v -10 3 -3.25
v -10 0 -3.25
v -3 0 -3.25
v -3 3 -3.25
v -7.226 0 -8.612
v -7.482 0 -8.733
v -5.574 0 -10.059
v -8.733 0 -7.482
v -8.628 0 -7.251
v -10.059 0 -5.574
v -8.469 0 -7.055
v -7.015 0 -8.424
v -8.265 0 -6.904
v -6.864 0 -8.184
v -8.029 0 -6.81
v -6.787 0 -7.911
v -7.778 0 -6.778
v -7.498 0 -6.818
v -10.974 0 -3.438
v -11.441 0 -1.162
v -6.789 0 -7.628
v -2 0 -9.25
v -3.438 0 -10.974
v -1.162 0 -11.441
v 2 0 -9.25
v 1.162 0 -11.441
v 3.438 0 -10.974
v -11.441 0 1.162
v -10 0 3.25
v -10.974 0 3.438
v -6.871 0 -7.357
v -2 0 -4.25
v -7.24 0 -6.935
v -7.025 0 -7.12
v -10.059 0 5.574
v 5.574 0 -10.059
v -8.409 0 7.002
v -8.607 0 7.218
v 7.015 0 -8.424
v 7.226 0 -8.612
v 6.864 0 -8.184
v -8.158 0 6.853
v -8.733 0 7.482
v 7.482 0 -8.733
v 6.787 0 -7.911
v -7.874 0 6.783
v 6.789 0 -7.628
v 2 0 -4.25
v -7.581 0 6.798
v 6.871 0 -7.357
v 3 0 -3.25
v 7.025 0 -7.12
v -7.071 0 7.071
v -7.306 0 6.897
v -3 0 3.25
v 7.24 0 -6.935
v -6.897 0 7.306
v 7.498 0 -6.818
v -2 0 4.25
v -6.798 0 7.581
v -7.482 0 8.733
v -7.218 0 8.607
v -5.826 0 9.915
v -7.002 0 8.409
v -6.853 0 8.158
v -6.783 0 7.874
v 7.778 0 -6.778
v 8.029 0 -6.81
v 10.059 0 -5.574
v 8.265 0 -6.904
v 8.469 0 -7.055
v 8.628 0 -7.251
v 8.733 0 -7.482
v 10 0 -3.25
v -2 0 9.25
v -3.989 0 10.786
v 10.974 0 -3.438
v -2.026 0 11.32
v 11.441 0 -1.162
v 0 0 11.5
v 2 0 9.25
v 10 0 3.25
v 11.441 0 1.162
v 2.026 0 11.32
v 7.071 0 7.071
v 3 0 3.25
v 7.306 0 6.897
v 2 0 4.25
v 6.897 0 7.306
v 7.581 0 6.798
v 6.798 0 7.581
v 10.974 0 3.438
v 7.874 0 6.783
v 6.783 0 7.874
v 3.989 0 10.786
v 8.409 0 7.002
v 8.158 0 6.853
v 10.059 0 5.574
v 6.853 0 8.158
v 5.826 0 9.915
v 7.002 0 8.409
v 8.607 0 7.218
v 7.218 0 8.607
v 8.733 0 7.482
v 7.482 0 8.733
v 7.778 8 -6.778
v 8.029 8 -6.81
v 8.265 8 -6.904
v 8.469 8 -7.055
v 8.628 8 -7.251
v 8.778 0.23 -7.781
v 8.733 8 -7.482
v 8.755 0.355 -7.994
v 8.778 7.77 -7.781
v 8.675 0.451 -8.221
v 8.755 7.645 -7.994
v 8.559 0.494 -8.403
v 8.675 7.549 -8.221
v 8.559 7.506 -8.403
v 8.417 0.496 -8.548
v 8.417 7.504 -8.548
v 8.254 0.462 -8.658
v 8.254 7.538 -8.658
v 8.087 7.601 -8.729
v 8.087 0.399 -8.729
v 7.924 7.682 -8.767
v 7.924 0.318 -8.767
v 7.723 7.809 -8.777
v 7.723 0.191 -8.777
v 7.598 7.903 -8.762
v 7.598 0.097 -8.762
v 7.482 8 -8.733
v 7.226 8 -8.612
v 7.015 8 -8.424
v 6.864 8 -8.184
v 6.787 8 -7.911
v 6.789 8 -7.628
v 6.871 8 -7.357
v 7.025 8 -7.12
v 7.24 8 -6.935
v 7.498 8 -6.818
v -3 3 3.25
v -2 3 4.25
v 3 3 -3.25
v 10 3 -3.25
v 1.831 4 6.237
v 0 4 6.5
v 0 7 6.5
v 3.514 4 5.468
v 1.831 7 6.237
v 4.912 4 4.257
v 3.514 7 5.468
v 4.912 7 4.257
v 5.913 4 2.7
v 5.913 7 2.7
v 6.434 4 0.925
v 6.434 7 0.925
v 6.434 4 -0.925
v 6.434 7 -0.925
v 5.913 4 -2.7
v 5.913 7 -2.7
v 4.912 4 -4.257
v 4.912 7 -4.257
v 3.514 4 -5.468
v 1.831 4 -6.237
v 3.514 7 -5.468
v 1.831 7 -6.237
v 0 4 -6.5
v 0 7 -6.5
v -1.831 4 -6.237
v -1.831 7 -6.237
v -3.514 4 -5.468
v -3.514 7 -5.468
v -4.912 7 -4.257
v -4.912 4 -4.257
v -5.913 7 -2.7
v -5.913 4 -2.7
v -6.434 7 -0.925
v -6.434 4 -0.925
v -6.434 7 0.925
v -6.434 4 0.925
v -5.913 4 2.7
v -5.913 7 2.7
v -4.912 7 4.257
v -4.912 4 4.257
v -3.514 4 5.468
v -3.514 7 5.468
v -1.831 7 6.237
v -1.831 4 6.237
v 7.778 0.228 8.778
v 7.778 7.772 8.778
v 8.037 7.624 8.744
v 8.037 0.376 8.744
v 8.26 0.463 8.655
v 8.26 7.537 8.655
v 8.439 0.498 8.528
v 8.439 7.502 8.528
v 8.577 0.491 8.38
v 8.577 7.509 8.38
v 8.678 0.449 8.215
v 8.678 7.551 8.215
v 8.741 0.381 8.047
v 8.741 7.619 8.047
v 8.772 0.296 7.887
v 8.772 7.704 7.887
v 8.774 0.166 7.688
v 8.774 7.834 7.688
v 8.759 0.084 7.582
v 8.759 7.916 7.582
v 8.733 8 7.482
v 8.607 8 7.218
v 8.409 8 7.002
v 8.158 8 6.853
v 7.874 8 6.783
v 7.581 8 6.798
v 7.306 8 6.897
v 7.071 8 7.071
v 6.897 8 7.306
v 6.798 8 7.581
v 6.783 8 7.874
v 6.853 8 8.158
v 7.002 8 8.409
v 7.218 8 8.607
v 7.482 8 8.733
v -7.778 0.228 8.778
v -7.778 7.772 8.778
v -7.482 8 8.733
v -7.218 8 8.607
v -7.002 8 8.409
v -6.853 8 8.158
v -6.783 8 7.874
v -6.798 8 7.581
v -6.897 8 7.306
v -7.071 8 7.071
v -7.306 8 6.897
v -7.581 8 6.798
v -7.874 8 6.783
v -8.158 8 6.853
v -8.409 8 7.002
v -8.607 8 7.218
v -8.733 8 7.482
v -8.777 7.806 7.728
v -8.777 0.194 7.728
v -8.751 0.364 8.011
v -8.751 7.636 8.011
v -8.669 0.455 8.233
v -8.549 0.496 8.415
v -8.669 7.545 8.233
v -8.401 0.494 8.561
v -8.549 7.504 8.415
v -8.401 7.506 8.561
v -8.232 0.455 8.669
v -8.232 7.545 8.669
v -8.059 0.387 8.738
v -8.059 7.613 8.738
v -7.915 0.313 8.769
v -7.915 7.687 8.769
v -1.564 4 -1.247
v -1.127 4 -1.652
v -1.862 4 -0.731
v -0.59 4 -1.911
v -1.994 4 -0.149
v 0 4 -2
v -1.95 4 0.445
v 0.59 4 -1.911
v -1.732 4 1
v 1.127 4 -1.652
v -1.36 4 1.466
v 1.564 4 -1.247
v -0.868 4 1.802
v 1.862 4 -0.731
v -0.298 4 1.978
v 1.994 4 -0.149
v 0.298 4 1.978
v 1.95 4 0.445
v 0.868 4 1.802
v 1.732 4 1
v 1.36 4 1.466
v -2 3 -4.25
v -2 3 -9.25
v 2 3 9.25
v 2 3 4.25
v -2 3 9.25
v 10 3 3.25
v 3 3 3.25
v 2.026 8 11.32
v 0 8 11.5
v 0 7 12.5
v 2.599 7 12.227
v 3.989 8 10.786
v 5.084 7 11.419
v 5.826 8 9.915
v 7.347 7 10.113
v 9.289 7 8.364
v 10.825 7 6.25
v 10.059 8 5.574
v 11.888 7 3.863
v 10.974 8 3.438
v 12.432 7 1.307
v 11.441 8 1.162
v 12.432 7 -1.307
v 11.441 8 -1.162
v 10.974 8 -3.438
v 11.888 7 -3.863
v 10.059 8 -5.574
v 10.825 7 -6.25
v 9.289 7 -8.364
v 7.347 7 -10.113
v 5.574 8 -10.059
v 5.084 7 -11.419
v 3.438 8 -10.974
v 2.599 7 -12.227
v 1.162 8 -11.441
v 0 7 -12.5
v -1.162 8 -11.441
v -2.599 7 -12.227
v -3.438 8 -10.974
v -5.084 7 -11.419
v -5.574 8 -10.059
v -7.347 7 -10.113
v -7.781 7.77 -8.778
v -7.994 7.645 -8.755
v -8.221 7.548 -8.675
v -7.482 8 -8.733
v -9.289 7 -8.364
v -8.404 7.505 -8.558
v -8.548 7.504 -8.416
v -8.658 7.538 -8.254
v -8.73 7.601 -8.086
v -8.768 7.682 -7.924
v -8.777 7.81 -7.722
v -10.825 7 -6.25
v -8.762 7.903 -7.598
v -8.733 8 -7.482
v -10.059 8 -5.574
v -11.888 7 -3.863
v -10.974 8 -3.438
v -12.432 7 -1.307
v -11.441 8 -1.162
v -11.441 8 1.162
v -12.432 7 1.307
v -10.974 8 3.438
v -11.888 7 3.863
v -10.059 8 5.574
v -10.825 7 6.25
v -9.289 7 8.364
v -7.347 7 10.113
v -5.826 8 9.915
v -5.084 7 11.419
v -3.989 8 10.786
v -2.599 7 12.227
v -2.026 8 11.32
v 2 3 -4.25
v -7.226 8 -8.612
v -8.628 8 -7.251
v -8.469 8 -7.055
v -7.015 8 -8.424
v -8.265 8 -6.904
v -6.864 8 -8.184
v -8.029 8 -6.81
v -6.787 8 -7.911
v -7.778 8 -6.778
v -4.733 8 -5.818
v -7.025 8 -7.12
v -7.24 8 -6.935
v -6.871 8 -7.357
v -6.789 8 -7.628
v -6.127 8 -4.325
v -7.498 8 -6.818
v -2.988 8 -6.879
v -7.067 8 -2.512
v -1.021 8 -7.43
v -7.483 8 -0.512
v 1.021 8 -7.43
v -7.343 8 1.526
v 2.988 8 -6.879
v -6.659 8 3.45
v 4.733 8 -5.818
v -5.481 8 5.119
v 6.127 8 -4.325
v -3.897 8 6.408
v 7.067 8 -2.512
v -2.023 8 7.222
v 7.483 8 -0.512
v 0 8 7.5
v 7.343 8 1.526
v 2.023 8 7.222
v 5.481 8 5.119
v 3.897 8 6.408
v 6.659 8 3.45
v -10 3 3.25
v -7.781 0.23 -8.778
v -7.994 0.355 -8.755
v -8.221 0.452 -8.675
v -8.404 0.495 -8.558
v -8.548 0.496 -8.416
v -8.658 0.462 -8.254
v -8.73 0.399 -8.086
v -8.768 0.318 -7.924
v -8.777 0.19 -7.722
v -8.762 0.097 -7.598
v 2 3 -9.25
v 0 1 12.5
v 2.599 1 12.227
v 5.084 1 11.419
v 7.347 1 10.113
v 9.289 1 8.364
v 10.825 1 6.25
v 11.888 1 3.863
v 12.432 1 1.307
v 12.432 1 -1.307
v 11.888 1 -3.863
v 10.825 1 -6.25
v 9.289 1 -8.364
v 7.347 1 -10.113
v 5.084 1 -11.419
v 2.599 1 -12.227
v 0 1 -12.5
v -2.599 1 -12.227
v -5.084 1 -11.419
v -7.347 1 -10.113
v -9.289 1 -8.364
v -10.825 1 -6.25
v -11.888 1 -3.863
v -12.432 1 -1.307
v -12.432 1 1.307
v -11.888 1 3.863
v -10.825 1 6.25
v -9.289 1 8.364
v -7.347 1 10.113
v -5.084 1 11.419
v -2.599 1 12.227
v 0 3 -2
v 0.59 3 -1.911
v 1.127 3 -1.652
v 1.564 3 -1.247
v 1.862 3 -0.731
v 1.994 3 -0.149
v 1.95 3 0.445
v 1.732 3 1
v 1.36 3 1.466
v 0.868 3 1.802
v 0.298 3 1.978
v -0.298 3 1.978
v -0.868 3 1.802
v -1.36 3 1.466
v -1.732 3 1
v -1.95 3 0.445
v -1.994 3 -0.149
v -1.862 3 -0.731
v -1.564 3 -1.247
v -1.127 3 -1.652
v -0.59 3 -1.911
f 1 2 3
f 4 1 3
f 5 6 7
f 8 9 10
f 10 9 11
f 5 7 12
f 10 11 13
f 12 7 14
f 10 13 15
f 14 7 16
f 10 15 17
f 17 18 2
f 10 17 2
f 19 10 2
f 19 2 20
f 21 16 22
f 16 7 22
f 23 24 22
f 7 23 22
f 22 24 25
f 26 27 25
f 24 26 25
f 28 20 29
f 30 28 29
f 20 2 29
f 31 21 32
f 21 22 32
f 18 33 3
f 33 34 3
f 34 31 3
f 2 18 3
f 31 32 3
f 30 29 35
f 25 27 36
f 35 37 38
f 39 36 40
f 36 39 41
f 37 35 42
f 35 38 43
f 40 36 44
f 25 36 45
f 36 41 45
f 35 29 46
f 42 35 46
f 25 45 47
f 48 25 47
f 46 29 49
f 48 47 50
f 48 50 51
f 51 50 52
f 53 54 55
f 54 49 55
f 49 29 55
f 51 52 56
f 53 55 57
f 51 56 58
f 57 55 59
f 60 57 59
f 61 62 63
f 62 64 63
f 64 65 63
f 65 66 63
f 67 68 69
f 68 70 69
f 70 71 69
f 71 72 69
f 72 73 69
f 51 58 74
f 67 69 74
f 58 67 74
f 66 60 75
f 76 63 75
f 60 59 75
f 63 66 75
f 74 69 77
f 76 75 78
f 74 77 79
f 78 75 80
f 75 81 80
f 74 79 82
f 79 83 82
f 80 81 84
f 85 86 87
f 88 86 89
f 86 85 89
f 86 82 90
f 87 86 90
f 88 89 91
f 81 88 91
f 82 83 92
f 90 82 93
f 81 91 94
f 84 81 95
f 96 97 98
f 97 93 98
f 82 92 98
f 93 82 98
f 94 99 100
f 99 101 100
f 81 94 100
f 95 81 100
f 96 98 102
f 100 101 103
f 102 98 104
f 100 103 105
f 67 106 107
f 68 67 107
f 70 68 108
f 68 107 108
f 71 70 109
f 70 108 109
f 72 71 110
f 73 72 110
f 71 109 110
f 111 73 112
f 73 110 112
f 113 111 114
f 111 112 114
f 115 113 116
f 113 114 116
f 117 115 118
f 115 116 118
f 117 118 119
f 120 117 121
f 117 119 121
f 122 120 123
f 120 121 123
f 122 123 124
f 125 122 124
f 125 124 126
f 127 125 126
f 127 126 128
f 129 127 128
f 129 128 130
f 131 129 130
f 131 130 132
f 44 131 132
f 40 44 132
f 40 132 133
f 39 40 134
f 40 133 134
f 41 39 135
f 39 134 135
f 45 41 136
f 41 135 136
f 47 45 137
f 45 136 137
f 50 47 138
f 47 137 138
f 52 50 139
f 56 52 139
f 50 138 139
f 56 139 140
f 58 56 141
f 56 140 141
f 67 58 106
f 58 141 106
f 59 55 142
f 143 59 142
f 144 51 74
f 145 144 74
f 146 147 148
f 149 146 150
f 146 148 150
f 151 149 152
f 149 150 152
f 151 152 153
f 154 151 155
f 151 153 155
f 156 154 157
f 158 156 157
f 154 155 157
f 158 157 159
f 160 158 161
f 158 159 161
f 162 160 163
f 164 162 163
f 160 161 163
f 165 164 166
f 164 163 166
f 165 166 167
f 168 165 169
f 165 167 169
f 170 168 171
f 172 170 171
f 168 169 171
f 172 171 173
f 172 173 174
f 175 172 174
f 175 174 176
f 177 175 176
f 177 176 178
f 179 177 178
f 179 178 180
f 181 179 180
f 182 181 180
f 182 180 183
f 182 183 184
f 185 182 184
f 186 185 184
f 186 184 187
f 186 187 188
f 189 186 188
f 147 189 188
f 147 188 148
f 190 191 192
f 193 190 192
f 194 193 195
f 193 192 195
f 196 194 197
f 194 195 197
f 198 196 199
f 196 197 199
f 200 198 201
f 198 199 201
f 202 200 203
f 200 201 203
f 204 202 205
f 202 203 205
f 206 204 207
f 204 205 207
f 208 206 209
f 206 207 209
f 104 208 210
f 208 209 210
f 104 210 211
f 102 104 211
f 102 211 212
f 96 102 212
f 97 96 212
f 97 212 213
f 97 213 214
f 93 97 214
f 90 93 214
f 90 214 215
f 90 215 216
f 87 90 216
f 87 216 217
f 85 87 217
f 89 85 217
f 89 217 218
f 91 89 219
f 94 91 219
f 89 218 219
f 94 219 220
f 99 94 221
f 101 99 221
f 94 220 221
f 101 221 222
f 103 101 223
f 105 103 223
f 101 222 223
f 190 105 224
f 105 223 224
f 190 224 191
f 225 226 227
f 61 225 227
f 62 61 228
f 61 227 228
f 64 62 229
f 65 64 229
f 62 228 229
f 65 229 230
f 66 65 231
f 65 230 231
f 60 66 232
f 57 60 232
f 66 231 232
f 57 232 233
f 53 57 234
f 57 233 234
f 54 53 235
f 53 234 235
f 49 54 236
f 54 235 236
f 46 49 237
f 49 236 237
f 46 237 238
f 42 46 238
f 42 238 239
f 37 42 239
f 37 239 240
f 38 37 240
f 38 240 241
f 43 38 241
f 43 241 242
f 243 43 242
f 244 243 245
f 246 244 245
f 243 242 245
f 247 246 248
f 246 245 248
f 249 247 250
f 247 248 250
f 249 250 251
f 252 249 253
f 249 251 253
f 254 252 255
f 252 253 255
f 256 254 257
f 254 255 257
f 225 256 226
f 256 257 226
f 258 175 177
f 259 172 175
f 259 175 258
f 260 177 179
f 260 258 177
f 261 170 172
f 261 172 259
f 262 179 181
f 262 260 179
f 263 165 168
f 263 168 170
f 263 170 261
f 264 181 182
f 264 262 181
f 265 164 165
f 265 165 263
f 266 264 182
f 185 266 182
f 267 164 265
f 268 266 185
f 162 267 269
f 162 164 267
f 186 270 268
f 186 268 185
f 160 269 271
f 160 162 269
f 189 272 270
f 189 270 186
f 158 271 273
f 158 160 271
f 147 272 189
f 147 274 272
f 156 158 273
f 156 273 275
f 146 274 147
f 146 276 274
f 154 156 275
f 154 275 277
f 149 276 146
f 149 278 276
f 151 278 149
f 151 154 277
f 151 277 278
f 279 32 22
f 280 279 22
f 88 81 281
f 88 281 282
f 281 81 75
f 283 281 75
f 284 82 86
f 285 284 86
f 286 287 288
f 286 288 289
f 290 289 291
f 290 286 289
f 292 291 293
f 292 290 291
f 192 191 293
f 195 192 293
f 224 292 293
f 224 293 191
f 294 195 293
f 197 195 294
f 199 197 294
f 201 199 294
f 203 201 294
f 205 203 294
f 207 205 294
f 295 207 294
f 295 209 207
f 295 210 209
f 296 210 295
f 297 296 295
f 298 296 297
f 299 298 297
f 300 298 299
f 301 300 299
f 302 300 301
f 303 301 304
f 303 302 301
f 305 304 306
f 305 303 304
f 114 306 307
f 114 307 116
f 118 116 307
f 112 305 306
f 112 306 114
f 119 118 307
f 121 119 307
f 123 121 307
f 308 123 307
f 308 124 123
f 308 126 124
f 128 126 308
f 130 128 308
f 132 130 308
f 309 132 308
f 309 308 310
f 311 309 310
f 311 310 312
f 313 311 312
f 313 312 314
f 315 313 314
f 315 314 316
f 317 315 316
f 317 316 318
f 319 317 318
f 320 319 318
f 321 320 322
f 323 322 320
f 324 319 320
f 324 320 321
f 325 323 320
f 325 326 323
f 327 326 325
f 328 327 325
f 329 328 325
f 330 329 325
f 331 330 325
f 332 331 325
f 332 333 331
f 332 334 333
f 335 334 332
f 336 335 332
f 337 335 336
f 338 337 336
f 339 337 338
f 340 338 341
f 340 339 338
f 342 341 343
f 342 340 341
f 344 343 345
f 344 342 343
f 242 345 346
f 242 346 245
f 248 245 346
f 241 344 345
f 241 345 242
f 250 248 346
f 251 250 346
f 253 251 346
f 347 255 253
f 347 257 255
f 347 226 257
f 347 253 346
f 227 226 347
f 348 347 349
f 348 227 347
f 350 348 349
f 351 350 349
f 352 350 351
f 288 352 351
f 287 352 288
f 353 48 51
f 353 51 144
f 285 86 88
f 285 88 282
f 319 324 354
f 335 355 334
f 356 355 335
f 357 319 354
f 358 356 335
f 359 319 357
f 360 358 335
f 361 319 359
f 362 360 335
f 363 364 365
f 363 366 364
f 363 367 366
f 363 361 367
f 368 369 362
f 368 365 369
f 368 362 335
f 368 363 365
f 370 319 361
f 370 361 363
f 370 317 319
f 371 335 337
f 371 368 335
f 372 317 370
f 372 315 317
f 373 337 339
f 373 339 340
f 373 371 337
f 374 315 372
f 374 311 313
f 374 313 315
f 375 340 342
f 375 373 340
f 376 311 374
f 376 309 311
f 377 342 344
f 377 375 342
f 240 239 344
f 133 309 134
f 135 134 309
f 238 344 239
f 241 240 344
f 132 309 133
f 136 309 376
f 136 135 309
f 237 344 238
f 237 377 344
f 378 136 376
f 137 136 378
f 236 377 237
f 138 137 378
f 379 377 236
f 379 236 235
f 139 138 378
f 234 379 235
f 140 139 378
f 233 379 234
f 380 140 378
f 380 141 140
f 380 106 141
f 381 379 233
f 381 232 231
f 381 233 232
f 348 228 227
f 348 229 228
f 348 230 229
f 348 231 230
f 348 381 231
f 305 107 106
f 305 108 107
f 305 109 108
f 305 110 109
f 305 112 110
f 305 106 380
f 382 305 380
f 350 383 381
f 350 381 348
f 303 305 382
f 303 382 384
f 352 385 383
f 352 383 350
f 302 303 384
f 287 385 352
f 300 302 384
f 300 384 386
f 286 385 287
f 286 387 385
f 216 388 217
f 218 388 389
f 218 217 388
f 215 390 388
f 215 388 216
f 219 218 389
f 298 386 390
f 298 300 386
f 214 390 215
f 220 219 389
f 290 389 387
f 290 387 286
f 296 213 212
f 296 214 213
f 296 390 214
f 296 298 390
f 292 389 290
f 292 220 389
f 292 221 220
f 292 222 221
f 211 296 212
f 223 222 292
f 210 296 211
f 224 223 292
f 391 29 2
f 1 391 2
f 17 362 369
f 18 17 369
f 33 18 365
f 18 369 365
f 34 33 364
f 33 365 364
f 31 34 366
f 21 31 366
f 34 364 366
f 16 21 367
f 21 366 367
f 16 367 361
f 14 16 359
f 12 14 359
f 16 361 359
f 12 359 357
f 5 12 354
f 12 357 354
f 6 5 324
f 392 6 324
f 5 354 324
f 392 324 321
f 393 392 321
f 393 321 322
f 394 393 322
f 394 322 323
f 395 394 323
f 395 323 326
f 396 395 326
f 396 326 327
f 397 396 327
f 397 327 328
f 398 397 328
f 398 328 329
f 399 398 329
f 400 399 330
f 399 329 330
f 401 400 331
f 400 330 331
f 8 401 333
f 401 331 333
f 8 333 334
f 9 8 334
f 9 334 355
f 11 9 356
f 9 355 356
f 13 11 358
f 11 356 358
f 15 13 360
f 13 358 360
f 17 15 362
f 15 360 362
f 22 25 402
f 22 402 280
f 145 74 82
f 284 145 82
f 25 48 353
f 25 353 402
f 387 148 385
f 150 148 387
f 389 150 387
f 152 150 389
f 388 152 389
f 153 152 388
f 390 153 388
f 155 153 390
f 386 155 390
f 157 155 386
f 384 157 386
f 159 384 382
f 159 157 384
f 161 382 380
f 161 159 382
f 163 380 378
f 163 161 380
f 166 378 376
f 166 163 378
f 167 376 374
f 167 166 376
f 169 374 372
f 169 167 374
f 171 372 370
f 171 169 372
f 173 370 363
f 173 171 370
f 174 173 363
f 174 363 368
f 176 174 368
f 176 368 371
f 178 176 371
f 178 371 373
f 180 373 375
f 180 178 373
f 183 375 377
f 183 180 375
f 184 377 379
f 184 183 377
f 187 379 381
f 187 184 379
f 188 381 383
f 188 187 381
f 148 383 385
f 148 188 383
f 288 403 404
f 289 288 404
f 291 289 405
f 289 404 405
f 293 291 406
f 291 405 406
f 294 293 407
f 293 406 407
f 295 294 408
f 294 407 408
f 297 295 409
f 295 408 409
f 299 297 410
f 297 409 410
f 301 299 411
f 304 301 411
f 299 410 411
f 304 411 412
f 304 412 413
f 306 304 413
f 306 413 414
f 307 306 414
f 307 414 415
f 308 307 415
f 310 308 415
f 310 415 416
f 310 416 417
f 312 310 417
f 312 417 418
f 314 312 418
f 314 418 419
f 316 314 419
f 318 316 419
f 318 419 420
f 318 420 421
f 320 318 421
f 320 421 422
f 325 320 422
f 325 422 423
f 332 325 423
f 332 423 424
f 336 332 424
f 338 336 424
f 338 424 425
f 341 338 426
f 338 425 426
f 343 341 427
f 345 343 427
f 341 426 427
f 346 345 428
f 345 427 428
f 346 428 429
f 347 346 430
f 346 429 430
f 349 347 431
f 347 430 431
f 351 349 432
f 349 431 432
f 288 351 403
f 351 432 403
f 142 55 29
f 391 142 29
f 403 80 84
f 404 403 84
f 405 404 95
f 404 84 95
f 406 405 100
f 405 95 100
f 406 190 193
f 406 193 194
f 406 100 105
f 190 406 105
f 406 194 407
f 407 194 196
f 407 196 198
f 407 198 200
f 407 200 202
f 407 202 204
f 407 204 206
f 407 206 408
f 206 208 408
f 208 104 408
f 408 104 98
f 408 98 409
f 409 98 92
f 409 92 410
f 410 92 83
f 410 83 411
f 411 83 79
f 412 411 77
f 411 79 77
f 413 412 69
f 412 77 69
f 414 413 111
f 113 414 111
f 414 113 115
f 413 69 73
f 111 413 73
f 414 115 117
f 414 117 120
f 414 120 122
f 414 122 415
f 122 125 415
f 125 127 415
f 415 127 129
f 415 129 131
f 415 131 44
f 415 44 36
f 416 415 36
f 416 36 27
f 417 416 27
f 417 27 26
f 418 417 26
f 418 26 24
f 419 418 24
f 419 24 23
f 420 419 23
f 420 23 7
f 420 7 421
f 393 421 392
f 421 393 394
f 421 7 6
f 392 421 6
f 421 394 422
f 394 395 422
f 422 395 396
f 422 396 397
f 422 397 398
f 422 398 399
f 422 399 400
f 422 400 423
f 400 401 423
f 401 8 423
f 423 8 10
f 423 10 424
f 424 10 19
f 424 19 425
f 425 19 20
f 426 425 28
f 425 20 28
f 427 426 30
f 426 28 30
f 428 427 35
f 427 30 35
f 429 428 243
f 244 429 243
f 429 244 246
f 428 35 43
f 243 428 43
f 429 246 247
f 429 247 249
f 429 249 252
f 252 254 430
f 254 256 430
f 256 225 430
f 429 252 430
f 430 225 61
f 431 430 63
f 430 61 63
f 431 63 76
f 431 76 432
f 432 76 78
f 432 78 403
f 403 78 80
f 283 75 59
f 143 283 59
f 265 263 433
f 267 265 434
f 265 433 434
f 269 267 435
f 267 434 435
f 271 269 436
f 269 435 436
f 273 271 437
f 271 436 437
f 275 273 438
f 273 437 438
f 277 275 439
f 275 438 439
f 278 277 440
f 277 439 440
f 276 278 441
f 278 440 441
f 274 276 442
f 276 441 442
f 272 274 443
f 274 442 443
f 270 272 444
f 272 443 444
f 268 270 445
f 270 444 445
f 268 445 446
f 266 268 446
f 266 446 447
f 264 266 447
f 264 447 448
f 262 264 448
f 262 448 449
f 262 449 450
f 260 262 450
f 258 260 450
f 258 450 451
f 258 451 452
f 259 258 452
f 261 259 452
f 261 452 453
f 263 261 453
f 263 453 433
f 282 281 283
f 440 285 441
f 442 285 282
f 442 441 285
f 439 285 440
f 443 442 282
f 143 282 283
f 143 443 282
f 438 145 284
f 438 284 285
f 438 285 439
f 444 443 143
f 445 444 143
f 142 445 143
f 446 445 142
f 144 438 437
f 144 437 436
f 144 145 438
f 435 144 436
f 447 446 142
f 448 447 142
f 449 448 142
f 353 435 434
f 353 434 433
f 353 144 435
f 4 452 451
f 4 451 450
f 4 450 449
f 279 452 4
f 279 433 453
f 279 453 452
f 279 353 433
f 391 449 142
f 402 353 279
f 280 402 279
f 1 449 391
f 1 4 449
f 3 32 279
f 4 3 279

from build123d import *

# Parameters (mm, degrees)
SKETCH1_R           = 12.5
BOSS_EXTRUDE1_DEPTH = 8
SKETCH2_R           = 6.5
CUT_EXTRUDE1_DEPTH  = 4
SKETCH4_R           = 2
CUT_EXTRUDE3_DEPTH  = 4
SKETCH5_W           = 4
SKETCH5_H           = 6
CUT_EXTRUDE4_DEPTH  = 3
SKETCH3_R           = 1
CUT_EXTRUDE2_DEPTH  = 20.403607912
CHAMFER1_SIZE       = 1
CHAMFER2_SIZE       = 1


with BuildPart() as part:
    # Sketch1 → Boss-Extrude1 (new body)
    with BuildSketch(Plane(origin=(0, 0, 0), x_dir=(1, 0, 0), z_dir=(0, 1, 0))):
        with Locations(Location((0, 0, 0), (0, 0, 270))):
            Circle(SKETCH1_R)
    extrude(amount=BOSS_EXTRUDE1_DEPTH)

    # Sketch2 → Cut-Extrude1 (cut)
    with BuildSketch(Plane(origin=(0, 8, 0), x_dir=(1, 0, 0), z_dir=(0, 1, 0))):
        with Locations(Location((0, 0, 0), (0, 0, 270))):
            Circle(SKETCH2_R)
    extrude(amount=-CUT_EXTRUDE1_DEPTH, mode=Mode.SUBTRACT)

    # Sketch4 → Cut-Extrude3 (cut)
    with BuildSketch(Plane(origin=(0, 0, 0), x_dir=(-1, 0, 0), z_dir=(0, -1, 0))):
        with Locations(Location((0, 0, 0), (0, 0, 90))):
            Circle(SKETCH4_R)
    extrude(amount=-CUT_EXTRUDE3_DEPTH, mode=Mode.SUBTRACT)

    # Sketch5 → Cut-Extrude4 (cut)
    with BuildSketch(Plane(origin=(0, 0, 0), x_dir=(-1, 0, 0), z_dir=(0, -1, 0))):
        with Locations((0, -6.25)):
            Rectangle(SKETCH5_W, SKETCH5_H)
        Polygon((-10, -3.25), (-2, -3.25), (-2, 4e-09), (-2, 3.25), (-10, 3.25), align=None)
        with BuildLine():
            Line((-2, -3.25), (2, -3.25))
            Line((2, -3.25), (2, 0))
            ThreePointArc((2, 0), (-2e-09, -2), (-2, 4e-09))
            Line((-2, 4e-09), (-2, -3.25))
        make_face()
        with Locations((0, 6.25)):
            Rectangle(SKETCH5_W, SKETCH5_H)
        Polygon((2, -3.25), (10, -3.25), (10, 3.25), (2, 3.25), (2, 0), align=None)
        with BuildLine():
            ThreePointArc((-2, 4e-09), (2e-09, 2), (2, 0))
            Line((2, 0), (2, 3.25))
            Line((2, 3.25), (-2, 3.25))
            Line((-2, 3.25), (-2, 4e-09))
        make_face()
    extrude(amount=-CUT_EXTRUDE4_DEPTH, mode=Mode.SUBTRACT)

    # Sketch3 → Cut-Extrude2 (cut, through all)
    with BuildSketch(Plane(origin=(0, 8, 0), x_dir=(1, 0, 0), z_dir=(0, 1, 0))):
        with Locations(Location((7.778174593, 7.778174593, 0), (0, 0, 270))):
            Circle(SKETCH3_R)
        with Locations(Location((7.778174593, -7.778174593, 0), (0, 0, 270))):
            Circle(SKETCH3_R)
        with Locations(Location((-7.778174593, -7.778174593, 0), (0, 0, 270))):
            Circle(SKETCH3_R)
        with Locations(Location((-7.778174593, 7.778174593, 0), (0, 0, 270))):
            Circle(SKETCH3_R)
    extrude(amount=-CUT_EXTRUDE2_DEPTH, mode=Mode.SUBTRACT)

    # Chamfer1
    # the kernel refuses this chamfer: 1 mm, written as the material it takes off along each edge
    with BuildSketch(Plane(origin=(0, 0, 0), x_dir=(0, 0, 1), z_dir=(-1, 0, 0))) as chamfer1_piece_1:
        Polygon((12.5, CHAMFER1_SIZE), (12.5 - CHAMFER1_SIZE, 0), (12.5, 0), align=None)
    revolve(axis=Axis((0, 0, 0), (0, 1, 0)), mode=Mode.SUBTRACT)
    with BuildSketch(Plane(origin=(0, 8, 0), x_dir=(0, 0, 1), z_dir=(-1, 0, 0))) as chamfer1_piece_2:
        Polygon((12.5, -CHAMFER1_SIZE), (12.5 - CHAMFER1_SIZE, 0), (12.5, 0), align=None)
    revolve(axis=Axis((0, 8, 0), (0, 1, 0)), mode=Mode.SUBTRACT)
    with BuildSketch(Plane(origin=(0, 8, 0), x_dir=(0, 0, 1), z_dir=(-1, 0, 0))) as chamfer1_piece_3:
        Polygon((6.5 + CHAMFER1_SIZE, 0), (6.5, -CHAMFER1_SIZE), (6.5, 0), align=None)
    revolve(axis=Axis((0, 8, 0), (0, 1, 0)), mode=Mode.SUBTRACT)

    # Chamfer2
    chamfer2_edges = [part.edges().sort_by_distance(p)[0] for p in [
        (2, 1.5, -3.25),
        (-2, 1.5, -3.25),
        (-2, 1.5, 3.25),
        (2, 1.5, 3.25),
    ]]
    chamfer(chamfer2_edges, length=CHAMFER2_SIZE)


solid = part.part
